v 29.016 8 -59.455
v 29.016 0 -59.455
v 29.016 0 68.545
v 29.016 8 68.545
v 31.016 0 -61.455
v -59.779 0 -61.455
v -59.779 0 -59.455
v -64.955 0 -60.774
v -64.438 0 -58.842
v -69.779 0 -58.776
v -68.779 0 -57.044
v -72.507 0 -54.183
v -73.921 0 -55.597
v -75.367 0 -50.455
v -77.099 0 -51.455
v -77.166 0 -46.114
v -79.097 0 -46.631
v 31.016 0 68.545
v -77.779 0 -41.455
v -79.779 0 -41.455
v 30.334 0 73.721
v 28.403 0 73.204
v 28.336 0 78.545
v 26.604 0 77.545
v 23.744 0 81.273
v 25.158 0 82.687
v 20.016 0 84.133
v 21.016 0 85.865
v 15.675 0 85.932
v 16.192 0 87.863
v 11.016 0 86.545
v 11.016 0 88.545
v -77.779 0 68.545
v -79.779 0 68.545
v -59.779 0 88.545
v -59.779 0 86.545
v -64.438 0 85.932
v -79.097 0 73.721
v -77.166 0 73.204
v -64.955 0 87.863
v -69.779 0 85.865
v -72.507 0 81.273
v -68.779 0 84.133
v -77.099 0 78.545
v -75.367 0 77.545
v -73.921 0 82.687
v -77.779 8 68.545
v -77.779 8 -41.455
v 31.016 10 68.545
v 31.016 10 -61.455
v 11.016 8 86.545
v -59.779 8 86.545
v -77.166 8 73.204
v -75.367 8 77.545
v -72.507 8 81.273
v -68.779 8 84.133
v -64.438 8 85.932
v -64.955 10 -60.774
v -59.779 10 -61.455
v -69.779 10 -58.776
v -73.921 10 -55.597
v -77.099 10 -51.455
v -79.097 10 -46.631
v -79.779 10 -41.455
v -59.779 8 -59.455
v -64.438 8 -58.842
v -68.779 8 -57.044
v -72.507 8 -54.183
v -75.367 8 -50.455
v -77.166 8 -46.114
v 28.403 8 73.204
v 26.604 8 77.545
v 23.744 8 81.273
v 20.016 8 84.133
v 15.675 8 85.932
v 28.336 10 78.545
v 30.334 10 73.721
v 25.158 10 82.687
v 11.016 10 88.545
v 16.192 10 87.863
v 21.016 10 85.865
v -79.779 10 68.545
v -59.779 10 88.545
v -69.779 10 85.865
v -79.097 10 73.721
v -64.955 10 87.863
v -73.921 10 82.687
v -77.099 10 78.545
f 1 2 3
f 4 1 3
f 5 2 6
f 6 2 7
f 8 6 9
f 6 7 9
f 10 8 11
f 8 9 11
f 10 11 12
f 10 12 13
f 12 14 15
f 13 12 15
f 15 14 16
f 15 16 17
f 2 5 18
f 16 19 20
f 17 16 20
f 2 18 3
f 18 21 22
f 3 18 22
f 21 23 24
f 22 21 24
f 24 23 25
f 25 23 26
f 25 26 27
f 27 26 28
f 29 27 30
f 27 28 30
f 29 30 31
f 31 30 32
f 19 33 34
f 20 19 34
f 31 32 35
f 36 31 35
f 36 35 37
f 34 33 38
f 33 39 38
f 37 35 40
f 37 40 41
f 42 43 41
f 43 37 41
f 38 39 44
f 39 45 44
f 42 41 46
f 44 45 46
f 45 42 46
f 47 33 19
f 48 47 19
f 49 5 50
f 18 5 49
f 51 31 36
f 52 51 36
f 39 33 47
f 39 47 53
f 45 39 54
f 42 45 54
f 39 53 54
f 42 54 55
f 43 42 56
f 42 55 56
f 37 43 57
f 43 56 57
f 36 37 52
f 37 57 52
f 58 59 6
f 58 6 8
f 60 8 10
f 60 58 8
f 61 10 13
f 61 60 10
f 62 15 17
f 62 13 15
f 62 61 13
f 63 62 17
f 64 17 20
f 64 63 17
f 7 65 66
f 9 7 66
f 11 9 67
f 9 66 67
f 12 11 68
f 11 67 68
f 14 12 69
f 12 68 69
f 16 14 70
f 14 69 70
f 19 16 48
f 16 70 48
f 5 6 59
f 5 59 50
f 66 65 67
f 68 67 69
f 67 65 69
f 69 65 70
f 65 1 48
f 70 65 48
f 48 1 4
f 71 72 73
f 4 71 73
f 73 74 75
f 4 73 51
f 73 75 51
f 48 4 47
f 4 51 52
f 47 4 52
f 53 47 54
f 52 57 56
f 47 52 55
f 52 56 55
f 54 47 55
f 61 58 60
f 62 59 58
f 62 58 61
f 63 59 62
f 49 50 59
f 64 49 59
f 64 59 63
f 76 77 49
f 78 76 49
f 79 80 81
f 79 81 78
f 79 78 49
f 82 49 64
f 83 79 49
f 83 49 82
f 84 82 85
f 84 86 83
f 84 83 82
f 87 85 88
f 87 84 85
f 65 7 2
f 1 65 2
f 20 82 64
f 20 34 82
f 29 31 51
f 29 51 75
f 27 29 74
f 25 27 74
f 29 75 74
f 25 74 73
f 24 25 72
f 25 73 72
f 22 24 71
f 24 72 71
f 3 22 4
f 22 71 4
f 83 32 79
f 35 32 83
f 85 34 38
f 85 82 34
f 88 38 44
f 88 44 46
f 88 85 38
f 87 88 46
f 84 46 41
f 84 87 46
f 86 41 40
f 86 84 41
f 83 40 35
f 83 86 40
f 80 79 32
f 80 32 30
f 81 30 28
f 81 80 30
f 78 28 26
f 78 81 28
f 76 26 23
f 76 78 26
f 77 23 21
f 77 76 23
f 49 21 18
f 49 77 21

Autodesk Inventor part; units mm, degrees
ref_plane "YZ Plane" through (0, 0, 0) normal (1, 0, 0) x (0, 1, 0)
ref_plane "XZ Plane" through (0, 0, 0) normal (0, 1, 0) x (-1, 0, 0)
ref_plane "XY Plane" through (0, 0, 0) normal (0, 0, 1) x (1, 0, 0)
sketch "Sketch1" plane through (0, 0, 0) normal (0, 1, 0) x (-1, 0, 0)
  line L0 (79.7789, 88.5449) -> (79.7789, -61.4551)
  line L1 (79.7789, -61.4551) -> (-31.0159, -61.4551)
  line L2 (-31.0159, -61.4551) -> (-31.0159, 88.5449)
  line L3 (-31.0159, 88.5449) -> (79.7789, 88.5449)
  point P0 (0, 0)
  dimension "d0" = 150
  dimension "d1" = 110.7948
extrude "Body" add sketch "Sketch1" along normal blind 10
fillet "Fillet6" radius 20 1 edges at (-79.7789, 5, -61.4551)
fillet "Fillet4" radius 20 1 edges at (-79.7789, 5, 88.5449)
fillet "Fillet2" radius 20 1 edges at (31.0159, 5, 88.5449)
shell "Shell2" thickness 2 removed faces 1 at (-42.8473, 0, 31.8782)
properties part number "picaseV2lid"
